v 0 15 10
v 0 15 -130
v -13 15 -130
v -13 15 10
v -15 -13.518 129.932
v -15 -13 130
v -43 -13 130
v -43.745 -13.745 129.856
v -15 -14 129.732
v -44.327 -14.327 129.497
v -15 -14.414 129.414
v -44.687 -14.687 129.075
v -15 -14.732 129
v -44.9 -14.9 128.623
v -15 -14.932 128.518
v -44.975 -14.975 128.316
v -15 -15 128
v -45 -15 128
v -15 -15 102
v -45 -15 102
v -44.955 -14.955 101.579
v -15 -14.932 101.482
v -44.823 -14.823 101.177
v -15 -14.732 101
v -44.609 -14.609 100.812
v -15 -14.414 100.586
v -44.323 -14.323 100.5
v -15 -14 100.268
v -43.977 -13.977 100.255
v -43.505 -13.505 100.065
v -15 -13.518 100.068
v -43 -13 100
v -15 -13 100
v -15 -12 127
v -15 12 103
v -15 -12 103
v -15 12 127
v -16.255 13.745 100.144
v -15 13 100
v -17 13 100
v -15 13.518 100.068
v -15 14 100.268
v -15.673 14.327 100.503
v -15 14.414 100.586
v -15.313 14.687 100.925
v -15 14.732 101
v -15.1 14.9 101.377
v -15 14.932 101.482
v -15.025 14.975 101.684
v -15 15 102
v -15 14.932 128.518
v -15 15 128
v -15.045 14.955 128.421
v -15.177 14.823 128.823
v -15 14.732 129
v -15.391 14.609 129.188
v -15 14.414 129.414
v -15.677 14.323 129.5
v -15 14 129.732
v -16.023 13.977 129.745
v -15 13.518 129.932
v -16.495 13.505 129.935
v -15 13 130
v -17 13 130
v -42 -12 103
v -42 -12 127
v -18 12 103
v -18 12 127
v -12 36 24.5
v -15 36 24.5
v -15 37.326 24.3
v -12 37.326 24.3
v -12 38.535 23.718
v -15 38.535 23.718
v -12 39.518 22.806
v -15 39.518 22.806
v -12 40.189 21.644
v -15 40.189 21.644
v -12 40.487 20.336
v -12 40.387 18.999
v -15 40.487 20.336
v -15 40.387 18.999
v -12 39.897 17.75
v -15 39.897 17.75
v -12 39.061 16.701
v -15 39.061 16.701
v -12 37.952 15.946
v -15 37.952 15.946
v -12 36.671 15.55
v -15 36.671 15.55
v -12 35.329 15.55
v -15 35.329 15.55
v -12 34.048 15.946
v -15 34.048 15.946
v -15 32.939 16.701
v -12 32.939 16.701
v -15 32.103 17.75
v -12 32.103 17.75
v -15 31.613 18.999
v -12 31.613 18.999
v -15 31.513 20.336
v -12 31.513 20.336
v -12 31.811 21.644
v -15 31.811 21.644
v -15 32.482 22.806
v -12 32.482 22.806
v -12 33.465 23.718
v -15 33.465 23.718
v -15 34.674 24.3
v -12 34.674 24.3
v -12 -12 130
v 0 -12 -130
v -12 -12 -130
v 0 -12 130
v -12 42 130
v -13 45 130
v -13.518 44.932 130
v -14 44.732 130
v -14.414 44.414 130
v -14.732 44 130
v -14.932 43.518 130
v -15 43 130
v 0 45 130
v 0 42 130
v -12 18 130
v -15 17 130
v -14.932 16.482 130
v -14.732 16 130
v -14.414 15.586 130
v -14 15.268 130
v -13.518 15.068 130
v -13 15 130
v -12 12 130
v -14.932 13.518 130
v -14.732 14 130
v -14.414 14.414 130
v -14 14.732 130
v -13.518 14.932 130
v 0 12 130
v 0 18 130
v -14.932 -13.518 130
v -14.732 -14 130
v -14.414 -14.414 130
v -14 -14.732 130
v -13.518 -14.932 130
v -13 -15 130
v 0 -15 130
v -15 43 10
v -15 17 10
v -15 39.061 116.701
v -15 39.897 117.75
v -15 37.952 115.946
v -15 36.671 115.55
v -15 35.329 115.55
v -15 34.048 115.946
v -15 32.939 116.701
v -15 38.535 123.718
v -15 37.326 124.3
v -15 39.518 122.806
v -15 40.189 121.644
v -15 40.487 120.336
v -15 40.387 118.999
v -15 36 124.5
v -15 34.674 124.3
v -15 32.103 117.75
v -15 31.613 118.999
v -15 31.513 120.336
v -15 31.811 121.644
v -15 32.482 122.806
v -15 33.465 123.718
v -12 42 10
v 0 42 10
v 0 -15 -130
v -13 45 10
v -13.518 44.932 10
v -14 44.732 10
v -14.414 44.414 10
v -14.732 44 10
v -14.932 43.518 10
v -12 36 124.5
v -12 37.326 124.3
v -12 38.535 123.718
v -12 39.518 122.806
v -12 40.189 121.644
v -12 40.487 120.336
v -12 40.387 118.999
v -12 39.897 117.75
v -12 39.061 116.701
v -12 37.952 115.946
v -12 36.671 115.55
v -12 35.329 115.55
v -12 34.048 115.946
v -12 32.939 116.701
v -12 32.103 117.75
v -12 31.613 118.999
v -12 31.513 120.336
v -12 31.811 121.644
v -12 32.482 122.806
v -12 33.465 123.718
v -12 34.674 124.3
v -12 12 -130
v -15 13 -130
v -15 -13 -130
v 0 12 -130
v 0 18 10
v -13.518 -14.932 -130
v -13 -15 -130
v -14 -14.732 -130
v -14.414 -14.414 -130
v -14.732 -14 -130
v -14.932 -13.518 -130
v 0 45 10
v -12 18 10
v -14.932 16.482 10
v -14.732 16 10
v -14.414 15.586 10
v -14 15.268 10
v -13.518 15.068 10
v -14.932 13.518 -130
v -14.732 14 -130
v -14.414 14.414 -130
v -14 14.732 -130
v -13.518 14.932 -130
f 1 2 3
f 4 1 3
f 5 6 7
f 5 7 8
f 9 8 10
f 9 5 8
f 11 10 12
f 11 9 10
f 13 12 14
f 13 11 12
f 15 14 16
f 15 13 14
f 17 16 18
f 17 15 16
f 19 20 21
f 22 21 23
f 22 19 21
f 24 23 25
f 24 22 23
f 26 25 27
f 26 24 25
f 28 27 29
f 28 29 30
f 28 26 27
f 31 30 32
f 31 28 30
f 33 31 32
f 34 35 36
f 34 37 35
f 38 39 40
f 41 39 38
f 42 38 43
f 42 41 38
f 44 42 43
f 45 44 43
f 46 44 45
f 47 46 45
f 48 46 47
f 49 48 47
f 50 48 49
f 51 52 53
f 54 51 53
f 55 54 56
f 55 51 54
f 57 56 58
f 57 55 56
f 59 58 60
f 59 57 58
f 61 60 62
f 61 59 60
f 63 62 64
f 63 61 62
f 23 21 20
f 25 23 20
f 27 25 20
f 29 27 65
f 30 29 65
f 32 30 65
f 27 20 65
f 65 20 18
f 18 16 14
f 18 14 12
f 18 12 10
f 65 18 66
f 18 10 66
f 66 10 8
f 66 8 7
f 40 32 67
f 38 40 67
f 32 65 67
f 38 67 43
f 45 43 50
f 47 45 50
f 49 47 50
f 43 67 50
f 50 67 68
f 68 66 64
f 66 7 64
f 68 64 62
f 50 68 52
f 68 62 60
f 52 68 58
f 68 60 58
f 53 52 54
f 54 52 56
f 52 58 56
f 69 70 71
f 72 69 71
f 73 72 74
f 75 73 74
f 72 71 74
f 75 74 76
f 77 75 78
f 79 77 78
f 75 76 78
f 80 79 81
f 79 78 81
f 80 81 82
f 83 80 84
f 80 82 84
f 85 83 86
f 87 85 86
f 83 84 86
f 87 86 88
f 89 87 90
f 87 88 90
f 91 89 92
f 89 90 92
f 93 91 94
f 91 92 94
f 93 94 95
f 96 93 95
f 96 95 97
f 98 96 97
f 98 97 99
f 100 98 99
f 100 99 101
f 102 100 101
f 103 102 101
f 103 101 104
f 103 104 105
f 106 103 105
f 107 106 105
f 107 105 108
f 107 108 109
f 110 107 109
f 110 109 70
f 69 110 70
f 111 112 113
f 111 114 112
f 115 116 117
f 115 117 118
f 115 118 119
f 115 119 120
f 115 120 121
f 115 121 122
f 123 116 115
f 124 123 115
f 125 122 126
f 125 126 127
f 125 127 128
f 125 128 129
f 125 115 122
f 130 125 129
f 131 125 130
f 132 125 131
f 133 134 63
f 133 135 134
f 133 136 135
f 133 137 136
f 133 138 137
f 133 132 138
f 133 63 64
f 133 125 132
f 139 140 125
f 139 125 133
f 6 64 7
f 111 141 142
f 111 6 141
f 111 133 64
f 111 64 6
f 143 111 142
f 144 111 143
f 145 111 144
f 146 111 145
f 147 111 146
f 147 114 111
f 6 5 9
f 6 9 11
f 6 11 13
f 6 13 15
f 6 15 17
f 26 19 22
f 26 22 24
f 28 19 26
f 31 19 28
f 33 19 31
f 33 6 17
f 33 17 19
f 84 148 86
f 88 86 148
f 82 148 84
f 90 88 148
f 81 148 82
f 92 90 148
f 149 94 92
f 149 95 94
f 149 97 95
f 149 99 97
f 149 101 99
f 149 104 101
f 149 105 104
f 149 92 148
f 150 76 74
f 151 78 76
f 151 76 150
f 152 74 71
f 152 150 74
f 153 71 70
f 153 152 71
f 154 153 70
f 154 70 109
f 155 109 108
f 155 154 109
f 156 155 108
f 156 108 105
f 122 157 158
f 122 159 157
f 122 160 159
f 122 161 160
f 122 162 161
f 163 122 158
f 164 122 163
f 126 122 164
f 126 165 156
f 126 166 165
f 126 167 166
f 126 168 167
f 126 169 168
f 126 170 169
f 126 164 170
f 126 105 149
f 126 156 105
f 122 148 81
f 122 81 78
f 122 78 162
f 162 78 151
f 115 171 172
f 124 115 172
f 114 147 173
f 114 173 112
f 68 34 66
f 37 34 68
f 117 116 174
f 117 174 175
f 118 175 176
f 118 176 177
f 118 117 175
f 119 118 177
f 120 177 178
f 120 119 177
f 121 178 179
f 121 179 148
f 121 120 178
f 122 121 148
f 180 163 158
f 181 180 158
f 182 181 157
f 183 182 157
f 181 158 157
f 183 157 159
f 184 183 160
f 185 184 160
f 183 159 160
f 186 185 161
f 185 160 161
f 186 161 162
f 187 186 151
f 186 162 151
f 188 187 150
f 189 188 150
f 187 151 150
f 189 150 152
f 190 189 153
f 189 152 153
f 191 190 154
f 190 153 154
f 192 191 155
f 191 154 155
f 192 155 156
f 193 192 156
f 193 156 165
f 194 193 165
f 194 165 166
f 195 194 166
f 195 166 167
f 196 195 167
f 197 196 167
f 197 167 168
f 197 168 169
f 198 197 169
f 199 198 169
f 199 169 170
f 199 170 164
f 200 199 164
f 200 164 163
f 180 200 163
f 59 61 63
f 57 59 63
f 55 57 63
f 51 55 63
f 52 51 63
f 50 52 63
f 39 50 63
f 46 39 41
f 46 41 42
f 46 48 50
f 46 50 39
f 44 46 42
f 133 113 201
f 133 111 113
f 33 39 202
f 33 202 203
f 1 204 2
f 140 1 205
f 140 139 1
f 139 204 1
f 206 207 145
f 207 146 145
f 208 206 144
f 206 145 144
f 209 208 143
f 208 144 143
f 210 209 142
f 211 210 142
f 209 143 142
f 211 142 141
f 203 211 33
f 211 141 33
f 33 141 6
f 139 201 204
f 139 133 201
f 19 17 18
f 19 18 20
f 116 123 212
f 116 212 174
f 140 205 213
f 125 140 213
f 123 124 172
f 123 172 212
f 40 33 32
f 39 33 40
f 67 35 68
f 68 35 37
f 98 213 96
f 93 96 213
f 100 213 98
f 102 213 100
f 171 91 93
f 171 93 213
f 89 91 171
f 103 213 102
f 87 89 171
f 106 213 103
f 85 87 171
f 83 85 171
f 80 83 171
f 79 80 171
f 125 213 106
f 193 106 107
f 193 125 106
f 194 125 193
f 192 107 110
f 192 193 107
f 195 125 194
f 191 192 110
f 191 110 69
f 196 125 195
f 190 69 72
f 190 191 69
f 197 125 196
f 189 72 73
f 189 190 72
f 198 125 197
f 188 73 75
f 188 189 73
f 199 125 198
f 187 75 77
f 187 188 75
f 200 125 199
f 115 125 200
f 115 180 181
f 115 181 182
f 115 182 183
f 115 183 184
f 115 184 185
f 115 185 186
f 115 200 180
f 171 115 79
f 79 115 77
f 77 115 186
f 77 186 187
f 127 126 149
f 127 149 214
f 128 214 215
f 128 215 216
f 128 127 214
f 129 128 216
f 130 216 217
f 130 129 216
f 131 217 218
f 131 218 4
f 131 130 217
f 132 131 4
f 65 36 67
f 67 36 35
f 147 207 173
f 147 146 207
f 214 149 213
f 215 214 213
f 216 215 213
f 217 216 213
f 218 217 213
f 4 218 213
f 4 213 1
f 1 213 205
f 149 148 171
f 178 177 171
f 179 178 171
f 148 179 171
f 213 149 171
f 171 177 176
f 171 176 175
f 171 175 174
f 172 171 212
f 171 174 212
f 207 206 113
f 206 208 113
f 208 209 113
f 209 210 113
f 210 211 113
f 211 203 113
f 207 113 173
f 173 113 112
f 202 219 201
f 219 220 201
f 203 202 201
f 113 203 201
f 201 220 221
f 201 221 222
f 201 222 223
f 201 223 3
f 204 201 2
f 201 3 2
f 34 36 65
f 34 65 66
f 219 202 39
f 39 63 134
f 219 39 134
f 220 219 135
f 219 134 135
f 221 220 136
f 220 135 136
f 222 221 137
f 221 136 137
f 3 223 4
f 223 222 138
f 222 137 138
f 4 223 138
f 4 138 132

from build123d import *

# Parameters (mm, degrees)
SALIENTE_EXTRUIR1_DEPTH = 130
REDONDEO1_R             = 2
SALIENTE_EXTRUIR2_DEPTH = 120
CROQUIS3_R              = 4.5
CORTAR_EXTRUIR1_DEPTH   = 20
CROQUIS4_W              = 24
CROQUIS4_H              = 24
SALIENTE_EXTRUIR3_DEPTH = 30
CORTAR_EXTRUIR2_DEPTH   = 50


with BuildPart() as part:
    # Croquis1 → Saliente-Extruir1 (new body, symmetric)
    with BuildSketch(Plane.XY):
        Polygon((-12, 12), (0, 12), (0, 15), (-15, 15), (-15, -15), (0, -15), (0, -12), (-12, -12), align=None)
    extrude(amount=SALIENTE_EXTRUIR1_DEPTH, both=True)

    # Redondeo1
    redondeo1_edges = [part.edges().sort_by_distance(p)[0] for p in [
        (-15, 15, 0),
        (-15, -15, 0),
    ]]
    fillet(redondeo1_edges, radius=REDONDEO1_R)

    # Croquis2 → Saliente-Extruir2 (add)
    with BuildSketch(Plane.XY.offset(130)):
        with BuildLine():
            Line((-15, 43), (-15, 17))
            ThreePointArc((-15, 17), (-14.414213562, 15.585786438), (-13, 15))
            Line((-13, 15), (0, 15))
            Line((0, 15), (0, 18))
            Line((0, 18), (-12, 18))
            Line((-12, 18), (-12, 42))
            Line((-12, 42), (0, 42))
            Line((0, 42), (0, 45))
            Line((0, 45), (-13, 45))
            ThreePointArc((-13, 45), (-14.414213562, 44.414213562), (-15, 43))
        make_face()
    extrude(amount=-SALIENTE_EXTRUIR2_DEPTH)

    # Croquis3 → Cortar-Extruir1 (cut)
    with BuildSketch(Plane.ZY.offset(15)):
        with Locations((120, 36)):
            Circle(CROQUIS3_R)
        with Locations((20, 36)):
            Circle(CROQUIS3_R)
    extrude(amount=-CORTAR_EXTRUIR1_DEPTH, mode=Mode.SUBTRACT)

    # Croquis4 → Saliente-Extruir3 (add)
    with BuildSketch(Plane.ZY.offset(15)):
        with BuildLine():
            Line((128, -15), (102, -15))
            ThreePointArc((102, -15), (100.585786438, -14.414213562), (100, -13))
            Line((100, -13), (100, 13))
            ThreePointArc((100, 13), (100.585786438, 14.414213562), (102, 15))
            Line((102, 15), (128, 15))
            ThreePointArc((128, 15), (129.414213562, 14.414213562), (130, 13))
            Line((130, 13), (130, -13))
            ThreePointArc((130, -13), (129.414213562, -14.414213562), (128, -15))
        make_face()
        with Locations((115, 0)):
            Rectangle(CROQUIS4_W, CROQUIS4_H, mode=Mode.SUBTRACT)
    extrude(amount=SALIENTE_EXTRUIR3_DEPTH)

    # Croquis5 → Cortar-Extruir2 (cut)
    with BuildSketch(Plane.XY.offset(130)):
        Polygon((-45, -15), (-15, 15), (-45, 15), align=None)
    extrude(amount=-CORTAR_EXTRUIR2_DEPTH, mode=Mode.SUBTRACT)


solid = part.part
